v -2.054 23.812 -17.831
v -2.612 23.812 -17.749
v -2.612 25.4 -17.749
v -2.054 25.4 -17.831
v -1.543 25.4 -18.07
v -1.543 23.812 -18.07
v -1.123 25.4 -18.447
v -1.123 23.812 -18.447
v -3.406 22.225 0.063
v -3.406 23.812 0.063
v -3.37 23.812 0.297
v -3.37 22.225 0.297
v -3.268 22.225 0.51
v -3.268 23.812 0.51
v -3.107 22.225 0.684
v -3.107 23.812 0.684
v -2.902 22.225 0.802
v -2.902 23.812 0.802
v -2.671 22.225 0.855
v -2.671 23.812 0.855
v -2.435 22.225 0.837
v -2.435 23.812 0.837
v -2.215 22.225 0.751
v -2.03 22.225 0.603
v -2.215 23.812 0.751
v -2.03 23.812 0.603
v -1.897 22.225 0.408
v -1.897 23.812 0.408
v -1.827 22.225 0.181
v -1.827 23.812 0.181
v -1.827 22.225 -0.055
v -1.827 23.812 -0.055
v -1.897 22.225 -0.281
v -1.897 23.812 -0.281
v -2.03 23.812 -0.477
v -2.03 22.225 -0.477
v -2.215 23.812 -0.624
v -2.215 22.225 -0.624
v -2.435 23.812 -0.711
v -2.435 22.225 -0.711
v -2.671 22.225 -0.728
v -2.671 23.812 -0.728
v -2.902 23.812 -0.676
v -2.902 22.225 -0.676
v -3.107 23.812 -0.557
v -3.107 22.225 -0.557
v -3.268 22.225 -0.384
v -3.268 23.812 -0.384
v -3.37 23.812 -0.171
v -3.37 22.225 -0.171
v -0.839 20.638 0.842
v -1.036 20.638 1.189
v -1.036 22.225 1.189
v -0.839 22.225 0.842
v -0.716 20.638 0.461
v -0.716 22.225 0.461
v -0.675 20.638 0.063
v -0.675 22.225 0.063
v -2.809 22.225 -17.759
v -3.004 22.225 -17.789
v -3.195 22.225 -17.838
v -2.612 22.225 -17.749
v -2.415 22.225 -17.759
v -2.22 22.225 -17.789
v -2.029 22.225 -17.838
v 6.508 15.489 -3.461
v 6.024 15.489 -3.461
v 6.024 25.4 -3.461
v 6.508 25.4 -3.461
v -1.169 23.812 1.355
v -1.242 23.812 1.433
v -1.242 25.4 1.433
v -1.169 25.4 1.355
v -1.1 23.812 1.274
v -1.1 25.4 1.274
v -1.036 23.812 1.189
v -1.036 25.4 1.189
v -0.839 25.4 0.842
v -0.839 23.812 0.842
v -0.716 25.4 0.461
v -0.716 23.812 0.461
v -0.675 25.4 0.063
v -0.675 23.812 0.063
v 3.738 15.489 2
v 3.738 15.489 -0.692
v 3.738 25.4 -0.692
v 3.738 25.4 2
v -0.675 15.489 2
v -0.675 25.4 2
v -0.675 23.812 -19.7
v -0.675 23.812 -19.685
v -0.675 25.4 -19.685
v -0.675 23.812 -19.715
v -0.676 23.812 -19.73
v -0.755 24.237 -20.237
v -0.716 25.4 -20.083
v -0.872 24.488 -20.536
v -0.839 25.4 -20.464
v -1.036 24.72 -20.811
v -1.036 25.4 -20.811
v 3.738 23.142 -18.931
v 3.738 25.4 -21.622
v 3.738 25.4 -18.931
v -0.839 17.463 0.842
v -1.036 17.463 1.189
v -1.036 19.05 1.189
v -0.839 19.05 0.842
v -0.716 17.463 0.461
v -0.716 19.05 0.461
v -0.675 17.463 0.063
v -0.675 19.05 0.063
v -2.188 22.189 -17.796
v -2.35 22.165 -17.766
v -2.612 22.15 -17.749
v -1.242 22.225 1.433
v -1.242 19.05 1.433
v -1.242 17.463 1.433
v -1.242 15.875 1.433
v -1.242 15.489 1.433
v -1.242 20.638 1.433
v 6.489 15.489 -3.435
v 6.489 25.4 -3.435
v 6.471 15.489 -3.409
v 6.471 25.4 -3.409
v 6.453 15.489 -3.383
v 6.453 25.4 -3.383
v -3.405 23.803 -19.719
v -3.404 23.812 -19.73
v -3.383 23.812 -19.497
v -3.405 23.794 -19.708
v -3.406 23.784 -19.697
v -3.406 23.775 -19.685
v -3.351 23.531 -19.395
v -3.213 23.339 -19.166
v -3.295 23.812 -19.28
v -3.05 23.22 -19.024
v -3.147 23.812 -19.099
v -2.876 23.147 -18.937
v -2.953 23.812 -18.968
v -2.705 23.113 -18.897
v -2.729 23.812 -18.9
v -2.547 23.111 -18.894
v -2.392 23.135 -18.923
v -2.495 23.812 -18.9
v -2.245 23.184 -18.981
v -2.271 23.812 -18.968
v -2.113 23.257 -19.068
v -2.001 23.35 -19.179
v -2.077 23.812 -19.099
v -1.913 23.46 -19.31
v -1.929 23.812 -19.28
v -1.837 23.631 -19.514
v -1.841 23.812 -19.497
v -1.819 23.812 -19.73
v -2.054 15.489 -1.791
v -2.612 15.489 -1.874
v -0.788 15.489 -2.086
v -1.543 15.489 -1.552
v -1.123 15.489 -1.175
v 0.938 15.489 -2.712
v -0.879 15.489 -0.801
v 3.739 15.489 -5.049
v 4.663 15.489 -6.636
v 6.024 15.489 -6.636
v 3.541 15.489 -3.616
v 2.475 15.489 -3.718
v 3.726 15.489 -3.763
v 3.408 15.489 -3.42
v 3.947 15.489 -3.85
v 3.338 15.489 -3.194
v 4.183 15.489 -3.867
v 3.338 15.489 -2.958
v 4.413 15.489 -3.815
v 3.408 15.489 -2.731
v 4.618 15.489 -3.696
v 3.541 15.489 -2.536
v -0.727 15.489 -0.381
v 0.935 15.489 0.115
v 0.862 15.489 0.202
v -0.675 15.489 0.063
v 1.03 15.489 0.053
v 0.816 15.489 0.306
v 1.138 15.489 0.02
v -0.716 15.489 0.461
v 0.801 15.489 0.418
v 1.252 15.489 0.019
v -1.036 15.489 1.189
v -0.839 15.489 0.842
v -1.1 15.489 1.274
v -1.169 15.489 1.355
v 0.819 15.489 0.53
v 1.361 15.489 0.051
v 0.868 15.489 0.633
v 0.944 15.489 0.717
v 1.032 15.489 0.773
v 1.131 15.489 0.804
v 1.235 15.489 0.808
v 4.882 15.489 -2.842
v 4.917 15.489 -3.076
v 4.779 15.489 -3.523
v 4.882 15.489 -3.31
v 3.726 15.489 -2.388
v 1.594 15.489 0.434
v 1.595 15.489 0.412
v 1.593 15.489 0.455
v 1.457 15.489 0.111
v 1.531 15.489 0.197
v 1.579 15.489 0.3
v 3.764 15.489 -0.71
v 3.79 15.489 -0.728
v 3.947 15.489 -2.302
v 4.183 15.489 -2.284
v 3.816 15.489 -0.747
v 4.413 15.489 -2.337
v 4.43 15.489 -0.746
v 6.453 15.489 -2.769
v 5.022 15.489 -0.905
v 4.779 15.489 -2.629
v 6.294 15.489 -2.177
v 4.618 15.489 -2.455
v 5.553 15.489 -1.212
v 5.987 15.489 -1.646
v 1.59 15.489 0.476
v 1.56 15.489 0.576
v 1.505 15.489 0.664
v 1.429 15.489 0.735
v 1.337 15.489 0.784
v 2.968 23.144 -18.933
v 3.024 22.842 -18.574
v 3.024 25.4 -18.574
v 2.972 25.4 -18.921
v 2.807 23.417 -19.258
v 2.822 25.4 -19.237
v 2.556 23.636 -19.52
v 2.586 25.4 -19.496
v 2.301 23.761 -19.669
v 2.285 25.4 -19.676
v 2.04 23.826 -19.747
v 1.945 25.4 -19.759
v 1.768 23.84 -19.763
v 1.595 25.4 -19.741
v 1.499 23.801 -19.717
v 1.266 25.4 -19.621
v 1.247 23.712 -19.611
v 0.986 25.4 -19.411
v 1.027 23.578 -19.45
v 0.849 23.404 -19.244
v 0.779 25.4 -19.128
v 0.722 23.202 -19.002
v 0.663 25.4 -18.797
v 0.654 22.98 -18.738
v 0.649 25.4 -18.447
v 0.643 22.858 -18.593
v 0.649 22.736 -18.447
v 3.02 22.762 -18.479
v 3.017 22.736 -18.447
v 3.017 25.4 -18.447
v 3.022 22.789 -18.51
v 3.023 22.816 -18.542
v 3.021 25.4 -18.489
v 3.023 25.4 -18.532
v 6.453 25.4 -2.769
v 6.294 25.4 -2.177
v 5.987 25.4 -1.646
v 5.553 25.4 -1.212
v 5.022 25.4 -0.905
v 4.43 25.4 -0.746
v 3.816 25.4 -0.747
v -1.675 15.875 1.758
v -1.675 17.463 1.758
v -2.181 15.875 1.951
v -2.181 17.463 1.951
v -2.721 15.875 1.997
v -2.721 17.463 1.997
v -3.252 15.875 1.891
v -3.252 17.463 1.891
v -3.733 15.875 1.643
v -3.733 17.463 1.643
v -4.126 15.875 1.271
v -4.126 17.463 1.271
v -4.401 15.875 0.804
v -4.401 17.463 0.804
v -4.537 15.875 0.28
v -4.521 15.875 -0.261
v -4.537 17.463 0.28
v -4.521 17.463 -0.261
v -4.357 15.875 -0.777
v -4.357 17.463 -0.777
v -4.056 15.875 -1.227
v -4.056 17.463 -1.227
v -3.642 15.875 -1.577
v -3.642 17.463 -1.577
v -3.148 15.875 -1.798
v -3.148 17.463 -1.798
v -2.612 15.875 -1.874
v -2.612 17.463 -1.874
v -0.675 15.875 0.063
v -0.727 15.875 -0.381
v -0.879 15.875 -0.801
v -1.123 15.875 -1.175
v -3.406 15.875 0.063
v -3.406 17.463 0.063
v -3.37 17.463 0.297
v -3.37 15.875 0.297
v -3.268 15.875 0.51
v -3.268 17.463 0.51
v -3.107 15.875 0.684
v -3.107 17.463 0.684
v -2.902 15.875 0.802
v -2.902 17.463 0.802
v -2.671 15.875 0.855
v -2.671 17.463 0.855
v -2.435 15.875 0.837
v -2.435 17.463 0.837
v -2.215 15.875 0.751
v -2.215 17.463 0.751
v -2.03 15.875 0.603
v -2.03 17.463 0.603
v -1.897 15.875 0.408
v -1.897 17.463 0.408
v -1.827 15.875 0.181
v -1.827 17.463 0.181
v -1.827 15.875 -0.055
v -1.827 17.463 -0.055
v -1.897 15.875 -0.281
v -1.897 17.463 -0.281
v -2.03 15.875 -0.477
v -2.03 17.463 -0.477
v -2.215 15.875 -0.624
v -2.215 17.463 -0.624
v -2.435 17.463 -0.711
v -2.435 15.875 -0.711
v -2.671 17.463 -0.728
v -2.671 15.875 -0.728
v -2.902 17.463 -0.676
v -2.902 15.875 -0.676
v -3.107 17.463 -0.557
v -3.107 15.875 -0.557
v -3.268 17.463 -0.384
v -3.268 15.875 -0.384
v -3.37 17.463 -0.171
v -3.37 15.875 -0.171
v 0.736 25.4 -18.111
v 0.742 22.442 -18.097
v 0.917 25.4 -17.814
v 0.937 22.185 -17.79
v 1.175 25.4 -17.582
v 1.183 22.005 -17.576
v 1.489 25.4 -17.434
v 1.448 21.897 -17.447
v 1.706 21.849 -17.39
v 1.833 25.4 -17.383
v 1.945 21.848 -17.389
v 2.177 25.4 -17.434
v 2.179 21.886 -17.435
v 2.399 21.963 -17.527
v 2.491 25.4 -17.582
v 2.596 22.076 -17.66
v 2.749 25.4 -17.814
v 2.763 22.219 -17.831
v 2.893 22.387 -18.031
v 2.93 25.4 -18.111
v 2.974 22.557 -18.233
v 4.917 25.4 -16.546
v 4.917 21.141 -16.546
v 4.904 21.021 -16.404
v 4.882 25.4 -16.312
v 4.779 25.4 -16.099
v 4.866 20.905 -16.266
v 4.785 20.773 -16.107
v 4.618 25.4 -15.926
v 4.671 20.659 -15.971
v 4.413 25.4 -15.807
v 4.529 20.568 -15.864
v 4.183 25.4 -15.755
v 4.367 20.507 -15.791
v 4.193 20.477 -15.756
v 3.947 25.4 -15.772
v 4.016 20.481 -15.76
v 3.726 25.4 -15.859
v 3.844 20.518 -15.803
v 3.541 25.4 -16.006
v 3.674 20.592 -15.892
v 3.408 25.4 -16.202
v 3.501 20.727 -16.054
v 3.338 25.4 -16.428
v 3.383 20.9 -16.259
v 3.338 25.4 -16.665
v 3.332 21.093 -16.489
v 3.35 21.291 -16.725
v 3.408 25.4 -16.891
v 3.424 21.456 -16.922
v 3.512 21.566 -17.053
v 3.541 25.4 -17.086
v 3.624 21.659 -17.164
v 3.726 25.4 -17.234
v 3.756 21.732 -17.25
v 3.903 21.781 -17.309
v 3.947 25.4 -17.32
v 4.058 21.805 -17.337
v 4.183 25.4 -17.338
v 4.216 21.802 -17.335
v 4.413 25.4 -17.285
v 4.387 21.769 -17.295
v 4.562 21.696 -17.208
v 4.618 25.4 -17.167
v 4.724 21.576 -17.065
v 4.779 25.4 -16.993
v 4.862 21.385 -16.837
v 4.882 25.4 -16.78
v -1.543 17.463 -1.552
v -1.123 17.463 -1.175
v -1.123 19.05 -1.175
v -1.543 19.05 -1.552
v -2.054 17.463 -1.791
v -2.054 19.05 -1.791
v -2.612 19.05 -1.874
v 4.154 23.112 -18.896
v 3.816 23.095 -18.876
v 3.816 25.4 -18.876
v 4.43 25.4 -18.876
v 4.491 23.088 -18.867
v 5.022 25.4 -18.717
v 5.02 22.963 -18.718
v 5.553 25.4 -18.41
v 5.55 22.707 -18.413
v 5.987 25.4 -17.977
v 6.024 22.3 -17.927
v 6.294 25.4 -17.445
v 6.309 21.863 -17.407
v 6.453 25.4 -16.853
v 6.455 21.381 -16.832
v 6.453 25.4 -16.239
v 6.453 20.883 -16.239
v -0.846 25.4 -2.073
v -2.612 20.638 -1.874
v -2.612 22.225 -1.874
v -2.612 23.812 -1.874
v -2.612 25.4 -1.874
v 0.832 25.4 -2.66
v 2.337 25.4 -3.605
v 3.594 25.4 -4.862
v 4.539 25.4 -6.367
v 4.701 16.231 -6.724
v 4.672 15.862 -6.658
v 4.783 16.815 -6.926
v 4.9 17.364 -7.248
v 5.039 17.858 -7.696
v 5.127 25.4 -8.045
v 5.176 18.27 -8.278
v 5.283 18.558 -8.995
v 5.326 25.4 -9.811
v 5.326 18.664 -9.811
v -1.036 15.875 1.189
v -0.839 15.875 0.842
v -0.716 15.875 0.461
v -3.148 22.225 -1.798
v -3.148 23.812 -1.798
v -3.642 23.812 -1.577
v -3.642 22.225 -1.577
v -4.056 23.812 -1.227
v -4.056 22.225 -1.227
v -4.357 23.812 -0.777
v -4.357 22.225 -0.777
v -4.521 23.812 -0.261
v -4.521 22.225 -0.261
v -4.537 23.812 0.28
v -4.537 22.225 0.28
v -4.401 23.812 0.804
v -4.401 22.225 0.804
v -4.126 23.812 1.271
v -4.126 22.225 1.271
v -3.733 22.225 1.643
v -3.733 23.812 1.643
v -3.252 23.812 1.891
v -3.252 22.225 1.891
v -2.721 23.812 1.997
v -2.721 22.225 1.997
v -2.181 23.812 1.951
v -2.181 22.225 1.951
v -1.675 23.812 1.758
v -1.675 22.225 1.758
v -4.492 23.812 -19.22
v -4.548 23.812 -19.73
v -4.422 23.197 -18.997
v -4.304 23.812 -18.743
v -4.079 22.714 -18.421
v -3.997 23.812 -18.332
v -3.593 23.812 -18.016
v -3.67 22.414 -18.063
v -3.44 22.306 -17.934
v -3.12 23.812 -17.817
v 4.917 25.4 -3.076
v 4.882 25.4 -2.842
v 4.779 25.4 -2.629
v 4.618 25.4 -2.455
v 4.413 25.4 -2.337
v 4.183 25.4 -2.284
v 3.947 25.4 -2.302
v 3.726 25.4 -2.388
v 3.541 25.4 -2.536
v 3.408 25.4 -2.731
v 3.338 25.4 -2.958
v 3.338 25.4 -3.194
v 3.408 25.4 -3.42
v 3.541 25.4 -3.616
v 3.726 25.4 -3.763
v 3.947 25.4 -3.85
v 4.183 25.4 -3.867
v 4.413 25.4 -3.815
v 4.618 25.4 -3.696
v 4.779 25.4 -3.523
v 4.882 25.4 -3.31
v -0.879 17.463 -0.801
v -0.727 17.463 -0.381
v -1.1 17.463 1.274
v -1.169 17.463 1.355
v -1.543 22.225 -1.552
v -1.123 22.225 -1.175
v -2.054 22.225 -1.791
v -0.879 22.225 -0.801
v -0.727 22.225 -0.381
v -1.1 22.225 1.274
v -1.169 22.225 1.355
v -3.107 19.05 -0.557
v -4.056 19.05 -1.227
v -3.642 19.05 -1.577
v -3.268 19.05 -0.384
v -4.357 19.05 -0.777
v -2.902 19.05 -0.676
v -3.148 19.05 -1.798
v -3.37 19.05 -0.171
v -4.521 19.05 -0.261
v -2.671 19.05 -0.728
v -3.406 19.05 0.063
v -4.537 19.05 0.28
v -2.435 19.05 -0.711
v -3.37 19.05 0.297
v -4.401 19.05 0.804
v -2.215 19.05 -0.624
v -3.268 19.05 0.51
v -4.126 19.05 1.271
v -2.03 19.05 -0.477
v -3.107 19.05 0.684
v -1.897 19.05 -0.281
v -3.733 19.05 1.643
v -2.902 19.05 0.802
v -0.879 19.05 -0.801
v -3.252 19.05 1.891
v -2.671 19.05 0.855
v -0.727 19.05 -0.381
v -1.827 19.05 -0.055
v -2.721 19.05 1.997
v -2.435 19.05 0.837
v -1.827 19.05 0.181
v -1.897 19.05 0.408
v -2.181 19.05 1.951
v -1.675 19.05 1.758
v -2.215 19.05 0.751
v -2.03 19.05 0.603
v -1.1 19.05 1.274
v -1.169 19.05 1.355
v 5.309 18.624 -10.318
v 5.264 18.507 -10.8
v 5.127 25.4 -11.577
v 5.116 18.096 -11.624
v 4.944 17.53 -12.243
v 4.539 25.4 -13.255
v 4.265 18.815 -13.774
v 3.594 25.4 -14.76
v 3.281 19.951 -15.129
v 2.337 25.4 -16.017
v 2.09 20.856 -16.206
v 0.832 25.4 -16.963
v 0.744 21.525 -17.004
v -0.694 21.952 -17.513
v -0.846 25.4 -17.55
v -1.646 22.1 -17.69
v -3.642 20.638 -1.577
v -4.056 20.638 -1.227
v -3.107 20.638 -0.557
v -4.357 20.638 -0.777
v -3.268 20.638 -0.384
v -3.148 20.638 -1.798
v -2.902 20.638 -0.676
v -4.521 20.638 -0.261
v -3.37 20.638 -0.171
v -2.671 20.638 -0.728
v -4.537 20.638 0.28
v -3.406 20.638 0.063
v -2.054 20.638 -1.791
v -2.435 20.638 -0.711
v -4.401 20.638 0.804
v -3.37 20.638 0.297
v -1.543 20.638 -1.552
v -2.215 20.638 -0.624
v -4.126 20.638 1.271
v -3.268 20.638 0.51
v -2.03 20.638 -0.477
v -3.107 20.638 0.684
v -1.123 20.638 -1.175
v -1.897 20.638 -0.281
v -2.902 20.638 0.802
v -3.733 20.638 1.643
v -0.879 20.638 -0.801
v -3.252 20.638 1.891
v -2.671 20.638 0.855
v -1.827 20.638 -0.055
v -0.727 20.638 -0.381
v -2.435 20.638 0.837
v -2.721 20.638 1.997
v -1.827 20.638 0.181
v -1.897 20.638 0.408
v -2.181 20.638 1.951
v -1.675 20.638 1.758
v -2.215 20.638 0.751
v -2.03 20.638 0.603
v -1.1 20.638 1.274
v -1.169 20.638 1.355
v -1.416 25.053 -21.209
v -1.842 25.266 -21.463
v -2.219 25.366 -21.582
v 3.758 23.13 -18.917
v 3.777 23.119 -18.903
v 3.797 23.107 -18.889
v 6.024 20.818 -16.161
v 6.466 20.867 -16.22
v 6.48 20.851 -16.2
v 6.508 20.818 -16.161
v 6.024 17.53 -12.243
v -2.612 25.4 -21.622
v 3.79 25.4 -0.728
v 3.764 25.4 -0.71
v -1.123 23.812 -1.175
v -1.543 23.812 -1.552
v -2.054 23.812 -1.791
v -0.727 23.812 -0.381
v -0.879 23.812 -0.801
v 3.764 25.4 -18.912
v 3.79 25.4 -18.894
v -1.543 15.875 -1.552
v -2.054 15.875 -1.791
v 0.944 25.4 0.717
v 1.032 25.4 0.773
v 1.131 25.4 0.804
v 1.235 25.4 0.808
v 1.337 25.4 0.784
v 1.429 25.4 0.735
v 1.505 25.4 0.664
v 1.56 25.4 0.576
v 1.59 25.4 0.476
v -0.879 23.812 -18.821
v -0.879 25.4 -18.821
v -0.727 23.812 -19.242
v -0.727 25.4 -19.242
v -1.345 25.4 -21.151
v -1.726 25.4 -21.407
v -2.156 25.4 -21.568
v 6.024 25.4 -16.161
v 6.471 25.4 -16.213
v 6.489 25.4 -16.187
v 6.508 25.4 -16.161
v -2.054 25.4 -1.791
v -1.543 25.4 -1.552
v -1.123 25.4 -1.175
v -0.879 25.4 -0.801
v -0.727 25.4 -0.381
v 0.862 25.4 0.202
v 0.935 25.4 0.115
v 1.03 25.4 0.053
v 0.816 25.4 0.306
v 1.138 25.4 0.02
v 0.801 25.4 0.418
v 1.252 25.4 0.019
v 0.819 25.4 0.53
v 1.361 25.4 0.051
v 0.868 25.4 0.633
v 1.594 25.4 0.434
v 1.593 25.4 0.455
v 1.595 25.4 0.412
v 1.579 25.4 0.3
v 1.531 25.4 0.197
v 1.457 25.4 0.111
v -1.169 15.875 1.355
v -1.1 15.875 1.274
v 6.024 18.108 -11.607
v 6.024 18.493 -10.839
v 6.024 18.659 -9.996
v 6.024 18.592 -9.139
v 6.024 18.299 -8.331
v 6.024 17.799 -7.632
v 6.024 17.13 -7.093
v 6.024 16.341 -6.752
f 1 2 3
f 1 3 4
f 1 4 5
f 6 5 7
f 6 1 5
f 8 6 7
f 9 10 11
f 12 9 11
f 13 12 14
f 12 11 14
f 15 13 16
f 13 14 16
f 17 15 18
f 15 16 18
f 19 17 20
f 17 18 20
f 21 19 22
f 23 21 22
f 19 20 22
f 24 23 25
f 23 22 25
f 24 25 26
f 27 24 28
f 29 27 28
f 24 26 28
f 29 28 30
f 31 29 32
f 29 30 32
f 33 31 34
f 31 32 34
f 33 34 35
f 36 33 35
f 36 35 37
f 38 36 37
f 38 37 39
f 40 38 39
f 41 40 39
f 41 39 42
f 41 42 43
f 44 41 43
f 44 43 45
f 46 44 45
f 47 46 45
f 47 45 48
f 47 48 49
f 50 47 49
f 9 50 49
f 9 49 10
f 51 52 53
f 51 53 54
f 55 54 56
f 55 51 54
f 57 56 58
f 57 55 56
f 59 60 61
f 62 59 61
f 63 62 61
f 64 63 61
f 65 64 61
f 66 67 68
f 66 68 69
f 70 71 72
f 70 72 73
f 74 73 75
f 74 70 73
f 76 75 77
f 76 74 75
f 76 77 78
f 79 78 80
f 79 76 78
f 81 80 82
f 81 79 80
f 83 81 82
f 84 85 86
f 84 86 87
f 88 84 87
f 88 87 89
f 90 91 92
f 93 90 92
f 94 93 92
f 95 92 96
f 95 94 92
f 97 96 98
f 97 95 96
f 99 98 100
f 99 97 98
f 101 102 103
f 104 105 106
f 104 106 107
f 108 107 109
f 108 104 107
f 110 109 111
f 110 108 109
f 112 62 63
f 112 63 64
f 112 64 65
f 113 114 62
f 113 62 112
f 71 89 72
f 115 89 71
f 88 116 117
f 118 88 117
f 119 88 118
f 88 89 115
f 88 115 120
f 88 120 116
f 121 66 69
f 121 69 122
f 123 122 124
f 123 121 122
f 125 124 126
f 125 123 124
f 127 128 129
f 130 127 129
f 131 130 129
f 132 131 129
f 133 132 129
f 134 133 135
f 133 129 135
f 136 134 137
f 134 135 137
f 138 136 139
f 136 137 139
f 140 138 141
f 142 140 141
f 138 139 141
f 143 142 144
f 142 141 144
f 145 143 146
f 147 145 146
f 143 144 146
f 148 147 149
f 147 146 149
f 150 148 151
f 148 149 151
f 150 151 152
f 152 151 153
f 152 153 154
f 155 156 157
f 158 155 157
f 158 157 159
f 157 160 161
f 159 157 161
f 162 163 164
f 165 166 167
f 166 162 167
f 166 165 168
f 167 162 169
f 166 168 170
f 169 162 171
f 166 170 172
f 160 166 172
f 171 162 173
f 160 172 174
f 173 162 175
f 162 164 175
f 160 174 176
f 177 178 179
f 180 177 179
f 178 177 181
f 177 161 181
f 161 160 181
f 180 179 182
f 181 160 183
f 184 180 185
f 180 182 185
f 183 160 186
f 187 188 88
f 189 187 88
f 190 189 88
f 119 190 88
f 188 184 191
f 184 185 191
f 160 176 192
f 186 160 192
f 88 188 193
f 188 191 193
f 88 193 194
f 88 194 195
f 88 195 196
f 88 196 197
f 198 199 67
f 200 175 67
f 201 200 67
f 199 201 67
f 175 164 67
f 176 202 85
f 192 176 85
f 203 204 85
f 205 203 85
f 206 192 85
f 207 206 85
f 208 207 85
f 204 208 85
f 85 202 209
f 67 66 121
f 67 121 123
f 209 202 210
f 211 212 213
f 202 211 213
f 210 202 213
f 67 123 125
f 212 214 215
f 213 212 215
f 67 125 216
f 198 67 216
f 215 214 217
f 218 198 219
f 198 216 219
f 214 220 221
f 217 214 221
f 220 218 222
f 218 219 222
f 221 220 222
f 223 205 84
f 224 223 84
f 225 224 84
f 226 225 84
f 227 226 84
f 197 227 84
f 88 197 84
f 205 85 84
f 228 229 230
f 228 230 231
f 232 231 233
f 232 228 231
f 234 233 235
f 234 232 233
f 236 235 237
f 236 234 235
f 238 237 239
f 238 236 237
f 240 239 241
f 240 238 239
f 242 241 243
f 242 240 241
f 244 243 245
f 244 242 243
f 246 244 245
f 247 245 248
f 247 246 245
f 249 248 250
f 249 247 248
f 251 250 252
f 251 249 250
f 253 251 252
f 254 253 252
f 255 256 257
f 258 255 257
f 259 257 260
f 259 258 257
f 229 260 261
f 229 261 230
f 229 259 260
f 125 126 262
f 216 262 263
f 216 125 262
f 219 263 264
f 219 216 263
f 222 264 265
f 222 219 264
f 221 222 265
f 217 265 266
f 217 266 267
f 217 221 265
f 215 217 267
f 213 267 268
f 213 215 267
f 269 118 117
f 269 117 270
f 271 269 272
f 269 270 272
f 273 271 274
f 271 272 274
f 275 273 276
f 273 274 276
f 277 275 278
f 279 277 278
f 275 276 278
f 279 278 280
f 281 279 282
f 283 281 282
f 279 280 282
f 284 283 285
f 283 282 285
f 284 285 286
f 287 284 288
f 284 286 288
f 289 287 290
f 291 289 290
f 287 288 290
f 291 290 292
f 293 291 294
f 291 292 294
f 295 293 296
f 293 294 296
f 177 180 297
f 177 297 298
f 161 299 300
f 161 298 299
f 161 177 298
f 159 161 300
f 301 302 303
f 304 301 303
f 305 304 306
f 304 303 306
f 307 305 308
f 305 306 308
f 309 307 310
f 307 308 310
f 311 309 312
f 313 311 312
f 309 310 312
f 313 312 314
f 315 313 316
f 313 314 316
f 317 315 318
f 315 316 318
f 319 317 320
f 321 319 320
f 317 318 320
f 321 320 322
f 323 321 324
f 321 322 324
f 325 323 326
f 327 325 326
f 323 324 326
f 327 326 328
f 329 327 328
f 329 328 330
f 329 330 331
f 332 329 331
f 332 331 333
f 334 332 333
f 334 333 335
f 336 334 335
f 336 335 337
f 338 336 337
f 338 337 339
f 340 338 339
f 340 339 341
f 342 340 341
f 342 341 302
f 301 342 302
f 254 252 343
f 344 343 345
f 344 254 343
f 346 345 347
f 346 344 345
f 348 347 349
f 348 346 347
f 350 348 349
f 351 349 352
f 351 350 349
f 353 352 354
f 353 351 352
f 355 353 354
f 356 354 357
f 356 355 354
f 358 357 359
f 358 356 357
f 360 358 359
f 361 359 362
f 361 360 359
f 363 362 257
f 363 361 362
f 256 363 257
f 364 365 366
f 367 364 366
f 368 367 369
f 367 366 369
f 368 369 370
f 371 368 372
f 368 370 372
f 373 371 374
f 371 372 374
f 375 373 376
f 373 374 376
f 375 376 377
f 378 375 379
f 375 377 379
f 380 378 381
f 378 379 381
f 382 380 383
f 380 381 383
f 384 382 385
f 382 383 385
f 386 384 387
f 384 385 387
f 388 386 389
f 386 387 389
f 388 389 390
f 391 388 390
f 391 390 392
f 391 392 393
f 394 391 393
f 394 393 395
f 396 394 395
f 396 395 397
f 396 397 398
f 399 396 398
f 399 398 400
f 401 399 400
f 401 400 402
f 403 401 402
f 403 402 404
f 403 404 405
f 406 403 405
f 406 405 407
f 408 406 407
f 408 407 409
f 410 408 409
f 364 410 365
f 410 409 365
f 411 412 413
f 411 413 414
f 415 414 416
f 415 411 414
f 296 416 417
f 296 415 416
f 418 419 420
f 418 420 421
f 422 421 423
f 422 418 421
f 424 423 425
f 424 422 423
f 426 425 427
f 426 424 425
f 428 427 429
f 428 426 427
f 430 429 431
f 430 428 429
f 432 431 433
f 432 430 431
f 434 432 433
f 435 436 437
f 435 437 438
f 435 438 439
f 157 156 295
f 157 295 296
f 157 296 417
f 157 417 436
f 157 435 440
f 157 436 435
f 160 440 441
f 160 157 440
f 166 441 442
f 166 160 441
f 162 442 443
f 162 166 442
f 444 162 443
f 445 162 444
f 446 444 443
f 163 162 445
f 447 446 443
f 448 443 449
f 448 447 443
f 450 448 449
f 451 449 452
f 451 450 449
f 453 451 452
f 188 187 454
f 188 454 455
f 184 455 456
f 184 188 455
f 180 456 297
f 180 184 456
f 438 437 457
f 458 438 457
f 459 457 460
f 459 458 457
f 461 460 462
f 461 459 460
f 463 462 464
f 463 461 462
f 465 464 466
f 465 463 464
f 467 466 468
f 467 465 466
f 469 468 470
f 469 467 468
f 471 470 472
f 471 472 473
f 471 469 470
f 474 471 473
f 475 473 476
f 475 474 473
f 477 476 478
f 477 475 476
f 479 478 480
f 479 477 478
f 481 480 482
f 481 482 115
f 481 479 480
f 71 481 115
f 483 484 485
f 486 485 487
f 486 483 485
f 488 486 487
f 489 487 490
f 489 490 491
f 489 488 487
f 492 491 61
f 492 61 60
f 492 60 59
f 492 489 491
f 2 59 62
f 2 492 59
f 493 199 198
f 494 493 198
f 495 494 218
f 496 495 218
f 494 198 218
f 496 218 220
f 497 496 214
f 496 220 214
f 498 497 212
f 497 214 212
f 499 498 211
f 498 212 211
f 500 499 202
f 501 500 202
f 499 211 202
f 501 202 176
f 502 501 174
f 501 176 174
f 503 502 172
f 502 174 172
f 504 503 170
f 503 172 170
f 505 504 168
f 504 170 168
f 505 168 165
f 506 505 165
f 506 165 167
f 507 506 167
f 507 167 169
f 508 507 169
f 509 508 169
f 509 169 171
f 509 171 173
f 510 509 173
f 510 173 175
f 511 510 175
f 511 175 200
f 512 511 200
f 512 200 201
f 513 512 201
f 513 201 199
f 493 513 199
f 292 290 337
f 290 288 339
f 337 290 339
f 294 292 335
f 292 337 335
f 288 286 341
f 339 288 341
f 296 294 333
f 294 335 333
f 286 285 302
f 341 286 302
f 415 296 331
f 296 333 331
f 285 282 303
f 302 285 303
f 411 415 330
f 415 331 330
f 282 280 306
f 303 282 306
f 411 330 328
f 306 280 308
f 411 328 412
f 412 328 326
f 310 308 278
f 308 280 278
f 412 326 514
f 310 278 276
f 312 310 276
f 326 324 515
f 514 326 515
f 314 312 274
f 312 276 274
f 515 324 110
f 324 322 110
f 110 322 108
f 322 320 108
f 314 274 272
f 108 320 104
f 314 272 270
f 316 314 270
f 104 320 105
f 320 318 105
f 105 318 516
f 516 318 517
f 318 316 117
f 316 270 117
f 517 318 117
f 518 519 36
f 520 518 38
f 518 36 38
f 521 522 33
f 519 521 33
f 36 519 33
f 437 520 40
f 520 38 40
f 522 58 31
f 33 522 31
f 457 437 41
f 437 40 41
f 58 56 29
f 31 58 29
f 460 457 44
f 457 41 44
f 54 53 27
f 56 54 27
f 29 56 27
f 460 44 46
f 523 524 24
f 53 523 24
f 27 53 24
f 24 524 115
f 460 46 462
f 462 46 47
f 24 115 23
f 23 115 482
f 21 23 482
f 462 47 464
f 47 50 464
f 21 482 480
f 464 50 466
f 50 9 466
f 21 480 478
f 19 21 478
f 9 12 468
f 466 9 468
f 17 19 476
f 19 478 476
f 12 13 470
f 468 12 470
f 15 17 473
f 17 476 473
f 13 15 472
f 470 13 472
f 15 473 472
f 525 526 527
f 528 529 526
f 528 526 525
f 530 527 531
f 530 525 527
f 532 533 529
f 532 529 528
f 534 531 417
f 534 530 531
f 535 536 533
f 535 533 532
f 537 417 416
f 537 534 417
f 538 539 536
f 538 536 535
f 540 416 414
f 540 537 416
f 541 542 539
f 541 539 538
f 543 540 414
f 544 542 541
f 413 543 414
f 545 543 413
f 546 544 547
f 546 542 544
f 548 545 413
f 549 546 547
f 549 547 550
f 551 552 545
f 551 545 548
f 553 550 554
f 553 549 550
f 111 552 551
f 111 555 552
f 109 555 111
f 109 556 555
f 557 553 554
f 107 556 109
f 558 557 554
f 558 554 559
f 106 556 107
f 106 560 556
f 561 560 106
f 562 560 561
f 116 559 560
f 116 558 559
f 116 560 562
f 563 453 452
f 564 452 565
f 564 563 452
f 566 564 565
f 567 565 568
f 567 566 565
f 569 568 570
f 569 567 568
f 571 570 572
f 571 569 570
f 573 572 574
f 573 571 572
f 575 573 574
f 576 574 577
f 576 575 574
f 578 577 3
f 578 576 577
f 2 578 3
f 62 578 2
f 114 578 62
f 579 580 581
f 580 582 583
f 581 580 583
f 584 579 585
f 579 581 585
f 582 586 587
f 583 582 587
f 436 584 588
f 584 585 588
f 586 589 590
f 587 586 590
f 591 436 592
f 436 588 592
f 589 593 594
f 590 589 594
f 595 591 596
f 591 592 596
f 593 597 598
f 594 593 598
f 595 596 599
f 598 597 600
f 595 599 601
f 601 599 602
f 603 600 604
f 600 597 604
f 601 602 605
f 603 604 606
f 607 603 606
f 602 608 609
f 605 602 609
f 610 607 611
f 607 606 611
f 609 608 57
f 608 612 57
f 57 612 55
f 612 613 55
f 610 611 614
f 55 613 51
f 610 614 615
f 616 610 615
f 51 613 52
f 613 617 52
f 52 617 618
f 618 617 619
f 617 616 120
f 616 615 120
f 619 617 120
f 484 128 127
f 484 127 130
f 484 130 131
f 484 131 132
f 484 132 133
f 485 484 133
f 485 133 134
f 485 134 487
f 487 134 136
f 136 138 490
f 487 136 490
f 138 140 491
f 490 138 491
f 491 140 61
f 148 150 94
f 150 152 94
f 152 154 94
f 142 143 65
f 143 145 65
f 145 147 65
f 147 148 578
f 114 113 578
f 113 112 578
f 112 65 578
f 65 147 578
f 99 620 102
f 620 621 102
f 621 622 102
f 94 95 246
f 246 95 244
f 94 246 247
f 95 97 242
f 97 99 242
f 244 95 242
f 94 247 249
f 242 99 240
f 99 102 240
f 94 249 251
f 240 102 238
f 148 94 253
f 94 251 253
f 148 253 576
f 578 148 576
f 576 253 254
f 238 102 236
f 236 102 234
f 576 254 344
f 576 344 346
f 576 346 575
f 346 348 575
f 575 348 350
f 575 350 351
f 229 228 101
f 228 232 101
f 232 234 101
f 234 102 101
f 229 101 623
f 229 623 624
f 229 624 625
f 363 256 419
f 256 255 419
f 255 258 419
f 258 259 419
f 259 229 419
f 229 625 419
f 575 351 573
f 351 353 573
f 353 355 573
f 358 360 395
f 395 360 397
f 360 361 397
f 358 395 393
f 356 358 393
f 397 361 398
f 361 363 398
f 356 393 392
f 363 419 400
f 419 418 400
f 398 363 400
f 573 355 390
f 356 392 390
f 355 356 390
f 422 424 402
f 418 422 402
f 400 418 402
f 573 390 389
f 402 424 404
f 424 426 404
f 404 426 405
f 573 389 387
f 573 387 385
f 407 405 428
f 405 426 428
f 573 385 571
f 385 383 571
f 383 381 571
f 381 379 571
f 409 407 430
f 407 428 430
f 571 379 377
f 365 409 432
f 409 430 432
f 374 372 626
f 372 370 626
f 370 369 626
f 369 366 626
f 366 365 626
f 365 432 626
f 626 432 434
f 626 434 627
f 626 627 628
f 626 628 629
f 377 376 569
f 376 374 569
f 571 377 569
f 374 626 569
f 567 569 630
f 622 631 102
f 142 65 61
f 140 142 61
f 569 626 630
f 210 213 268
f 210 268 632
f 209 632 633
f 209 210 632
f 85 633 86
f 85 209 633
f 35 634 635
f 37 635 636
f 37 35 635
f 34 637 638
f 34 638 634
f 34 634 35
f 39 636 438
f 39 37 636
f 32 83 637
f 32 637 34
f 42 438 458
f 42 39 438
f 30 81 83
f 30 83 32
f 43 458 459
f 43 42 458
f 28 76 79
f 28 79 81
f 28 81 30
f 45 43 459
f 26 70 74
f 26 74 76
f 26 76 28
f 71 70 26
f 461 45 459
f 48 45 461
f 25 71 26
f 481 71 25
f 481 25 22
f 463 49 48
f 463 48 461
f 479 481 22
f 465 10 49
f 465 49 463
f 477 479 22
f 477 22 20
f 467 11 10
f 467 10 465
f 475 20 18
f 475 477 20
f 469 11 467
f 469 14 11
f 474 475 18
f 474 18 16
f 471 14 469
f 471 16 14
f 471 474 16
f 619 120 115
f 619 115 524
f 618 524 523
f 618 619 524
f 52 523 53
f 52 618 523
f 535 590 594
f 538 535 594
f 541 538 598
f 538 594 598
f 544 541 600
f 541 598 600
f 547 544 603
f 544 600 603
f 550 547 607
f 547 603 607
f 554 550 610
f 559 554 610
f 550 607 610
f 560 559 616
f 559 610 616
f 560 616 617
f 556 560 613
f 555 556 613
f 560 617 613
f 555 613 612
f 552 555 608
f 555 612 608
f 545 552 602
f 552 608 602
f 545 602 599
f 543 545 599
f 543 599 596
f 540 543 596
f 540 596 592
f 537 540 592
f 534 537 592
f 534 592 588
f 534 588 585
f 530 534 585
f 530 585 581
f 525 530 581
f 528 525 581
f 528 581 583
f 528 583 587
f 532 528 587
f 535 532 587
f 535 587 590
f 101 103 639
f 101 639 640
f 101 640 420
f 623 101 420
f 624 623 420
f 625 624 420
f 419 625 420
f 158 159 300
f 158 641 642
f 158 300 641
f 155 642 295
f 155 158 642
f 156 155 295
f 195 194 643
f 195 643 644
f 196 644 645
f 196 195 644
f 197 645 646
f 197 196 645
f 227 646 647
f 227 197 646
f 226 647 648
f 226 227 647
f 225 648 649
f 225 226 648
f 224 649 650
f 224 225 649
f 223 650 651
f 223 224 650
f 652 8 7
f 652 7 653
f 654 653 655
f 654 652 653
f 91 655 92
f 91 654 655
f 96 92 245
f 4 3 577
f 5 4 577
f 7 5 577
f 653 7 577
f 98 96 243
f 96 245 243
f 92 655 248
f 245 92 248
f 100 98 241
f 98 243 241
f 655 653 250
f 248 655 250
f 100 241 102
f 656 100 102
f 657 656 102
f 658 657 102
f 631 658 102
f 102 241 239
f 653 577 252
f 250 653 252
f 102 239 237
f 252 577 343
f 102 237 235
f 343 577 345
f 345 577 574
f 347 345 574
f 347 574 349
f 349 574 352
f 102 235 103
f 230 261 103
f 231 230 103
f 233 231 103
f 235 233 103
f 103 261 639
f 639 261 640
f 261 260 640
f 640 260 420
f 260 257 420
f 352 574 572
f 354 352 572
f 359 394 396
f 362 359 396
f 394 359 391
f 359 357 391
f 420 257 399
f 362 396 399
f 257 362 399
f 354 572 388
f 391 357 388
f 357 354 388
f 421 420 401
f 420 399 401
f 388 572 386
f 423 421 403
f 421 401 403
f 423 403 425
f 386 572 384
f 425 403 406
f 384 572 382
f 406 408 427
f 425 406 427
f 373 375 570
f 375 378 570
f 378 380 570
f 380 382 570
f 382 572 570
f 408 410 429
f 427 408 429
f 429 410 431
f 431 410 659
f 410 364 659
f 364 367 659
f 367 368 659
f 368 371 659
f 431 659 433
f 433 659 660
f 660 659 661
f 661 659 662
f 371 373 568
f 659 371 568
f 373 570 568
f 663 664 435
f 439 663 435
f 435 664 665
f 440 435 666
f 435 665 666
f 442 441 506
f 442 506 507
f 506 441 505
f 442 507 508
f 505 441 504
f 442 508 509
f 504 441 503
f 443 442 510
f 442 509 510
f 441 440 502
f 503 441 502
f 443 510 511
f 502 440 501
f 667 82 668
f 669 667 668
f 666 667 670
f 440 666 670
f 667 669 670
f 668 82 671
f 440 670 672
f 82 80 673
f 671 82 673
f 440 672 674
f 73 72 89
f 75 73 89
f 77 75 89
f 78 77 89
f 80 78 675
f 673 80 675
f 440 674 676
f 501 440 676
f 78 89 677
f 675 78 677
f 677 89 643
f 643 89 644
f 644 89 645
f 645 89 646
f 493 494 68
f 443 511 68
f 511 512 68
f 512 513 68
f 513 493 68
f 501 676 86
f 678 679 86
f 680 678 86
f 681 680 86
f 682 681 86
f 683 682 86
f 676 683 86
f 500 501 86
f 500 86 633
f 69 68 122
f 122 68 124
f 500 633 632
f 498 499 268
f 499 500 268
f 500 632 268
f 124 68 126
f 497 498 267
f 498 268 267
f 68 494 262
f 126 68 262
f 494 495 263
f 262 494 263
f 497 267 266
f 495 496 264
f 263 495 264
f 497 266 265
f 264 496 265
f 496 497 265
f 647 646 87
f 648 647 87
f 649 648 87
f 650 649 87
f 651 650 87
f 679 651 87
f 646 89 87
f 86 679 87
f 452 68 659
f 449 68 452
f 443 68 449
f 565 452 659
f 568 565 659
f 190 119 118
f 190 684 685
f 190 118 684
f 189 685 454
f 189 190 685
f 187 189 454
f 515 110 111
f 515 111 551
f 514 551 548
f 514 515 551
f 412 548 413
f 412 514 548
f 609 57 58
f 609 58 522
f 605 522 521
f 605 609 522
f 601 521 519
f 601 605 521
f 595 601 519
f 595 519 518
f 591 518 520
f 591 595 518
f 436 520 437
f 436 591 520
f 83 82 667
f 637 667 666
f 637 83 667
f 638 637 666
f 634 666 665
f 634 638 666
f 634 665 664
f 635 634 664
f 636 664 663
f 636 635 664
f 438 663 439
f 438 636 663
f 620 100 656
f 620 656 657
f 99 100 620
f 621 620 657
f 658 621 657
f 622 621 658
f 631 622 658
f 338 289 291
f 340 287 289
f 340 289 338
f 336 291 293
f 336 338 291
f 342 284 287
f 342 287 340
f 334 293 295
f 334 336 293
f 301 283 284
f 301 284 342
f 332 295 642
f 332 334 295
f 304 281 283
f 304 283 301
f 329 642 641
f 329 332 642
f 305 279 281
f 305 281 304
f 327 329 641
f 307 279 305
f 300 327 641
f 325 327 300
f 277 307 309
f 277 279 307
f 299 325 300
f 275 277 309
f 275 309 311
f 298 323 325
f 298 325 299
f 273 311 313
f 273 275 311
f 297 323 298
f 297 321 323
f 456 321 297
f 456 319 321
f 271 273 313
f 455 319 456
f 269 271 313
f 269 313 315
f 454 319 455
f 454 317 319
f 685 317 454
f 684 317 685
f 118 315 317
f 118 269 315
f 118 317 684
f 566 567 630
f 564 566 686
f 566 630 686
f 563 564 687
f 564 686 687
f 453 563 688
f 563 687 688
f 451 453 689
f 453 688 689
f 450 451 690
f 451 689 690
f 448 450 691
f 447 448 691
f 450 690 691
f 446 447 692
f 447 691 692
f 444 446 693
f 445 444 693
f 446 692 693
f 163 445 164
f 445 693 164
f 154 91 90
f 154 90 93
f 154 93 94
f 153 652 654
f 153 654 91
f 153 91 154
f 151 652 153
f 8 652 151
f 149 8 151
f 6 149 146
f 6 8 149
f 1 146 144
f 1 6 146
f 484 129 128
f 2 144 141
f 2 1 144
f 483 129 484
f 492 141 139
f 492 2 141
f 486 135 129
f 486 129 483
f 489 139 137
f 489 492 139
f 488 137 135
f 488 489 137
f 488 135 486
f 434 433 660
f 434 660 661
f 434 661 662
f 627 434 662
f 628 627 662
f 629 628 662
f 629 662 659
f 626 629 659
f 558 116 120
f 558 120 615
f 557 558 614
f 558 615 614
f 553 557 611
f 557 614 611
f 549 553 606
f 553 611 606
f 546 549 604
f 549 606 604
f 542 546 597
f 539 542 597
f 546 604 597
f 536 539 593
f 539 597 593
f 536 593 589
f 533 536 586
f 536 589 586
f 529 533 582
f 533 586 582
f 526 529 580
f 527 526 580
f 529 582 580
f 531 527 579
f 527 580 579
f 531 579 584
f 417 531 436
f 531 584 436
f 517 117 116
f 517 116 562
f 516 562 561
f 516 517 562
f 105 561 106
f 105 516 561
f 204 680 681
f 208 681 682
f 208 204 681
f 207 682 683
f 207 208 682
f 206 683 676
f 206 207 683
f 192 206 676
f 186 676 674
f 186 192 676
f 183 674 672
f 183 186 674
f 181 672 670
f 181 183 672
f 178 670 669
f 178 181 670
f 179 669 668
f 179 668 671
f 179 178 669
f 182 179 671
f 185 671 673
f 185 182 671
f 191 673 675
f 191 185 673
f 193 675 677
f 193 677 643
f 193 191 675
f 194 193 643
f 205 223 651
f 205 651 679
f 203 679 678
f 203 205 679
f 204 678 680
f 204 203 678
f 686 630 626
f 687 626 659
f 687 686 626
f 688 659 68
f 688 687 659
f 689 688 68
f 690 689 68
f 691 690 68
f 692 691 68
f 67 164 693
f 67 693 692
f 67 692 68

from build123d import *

# Parameters (mm, degrees)
F0_R           = 0.79375
F1_DEPTH       = 25.4
F3_START       = -1.5875
F2_R           = 1.93675
F3_DEPTH       = 1.5875
F5_START       = 1.5875
F4_R           = 1.93675
F5_DEPTH       = 1.5875
F7_START       = 1.5875
F6_R           = 1.93675
F7_DEPTH       = 1.5875
F9_START       = 1.5875
F8_R           = 1.93675
F9_DEPTH       = 1.5875
F11_START      = 1.5875
F10_R          = 1.93675
F11_DEPTH      = 1.5875
F13_START      = 1.5875
F12_R          = 1.93675
F13_DEPTH      = 1.5875
F14_R          = 0.79375
F15_DEPTH      = 23.8135
F16_R          = 0.79375
F17_DEPTH      = 23.8135
F19_DEPTH      = 25.4
F19_DEPTH_BACK = 25.4
F20_R          = 3.175
F21_DEPTH      = 25.4


with BuildPart() as f1:
    # F0 (on Front) → F1 (new body)
    with BuildSketch(Plane.XZ):
        with BuildLine():
            ThreePointArc((1.5896937253, 0.4764627531), (2.6960840616, -0.0482905293), (3.7380205176, -0.6915898416))
            Line((3.7380205176, -0.6915898416), (3.7380205176, 1.9999169571))
            Line((3.7380205176, 1.9999169571), (-0.6752294824, 1.9999169571))
            Line((-0.6752294824, 1.9999169571), (-1.2424904239, 1.4326560155))
            ThreePointArc((-1.2424904239, 1.4326560155), (-1.1342950237, 1.3151450731), (-1.0361511327, 1.1891179217))
            ThreePointArc((-1.0361511327, 1.1891179217), (-0.0353529614, 0.9985724567), (0.9437888558, 0.7171726424))
            ThreePointArc((0.9437888558, 0.7171726424), (1.336612932, 0.7843066024), (1.5896937253, 0.4764627531))
        make_face()
        with BuildLine():
            ThreePointArc((-0.6752294824, 0.0631669571), (-0.7905484204, -0.5951562531), (-1.1227724786, -1.1750830429))
            Line((-1.1227724786, -1.1750830429), (3.7380205176, -1.1750830429))
            Line((3.7380205176, -1.1750830429), (3.7380205176, -0.6915898416))
            ThreePointArc((3.7380205176, -0.6915898416), (2.6960840616, -0.0482905293), (1.5896937253, 0.4764627531))
            ThreePointArc((1.5896937253, 0.4764627531), (1.5935929319, 0.4445453037), (1.5948955176, 0.4124169571))
            ThreePointArc((1.5948955176, 0.4124169571), (1.0297772788, 0.0529674082), (0.9437888558, 0.7171726424))
            ThreePointArc((0.9437888558, 0.7171726424), (-0.0353529614, 0.9985724567), (-1.0361511327, 1.1891179217))
            ThreePointArc((-1.0361511327, 1.1891179217), (-0.7676657728, 0.654358553), (-0.6752294824, 0.0631669571))
        make_face()
        with BuildLine():
            ThreePointArc((-2.6119794826, -1.8735830429), (3.0006805932, -4.1984229672), (5.3255205176, -9.8110830429))
            ThreePointArc((5.3255205176, -9.8110830429), (3.0006805933, -15.4237431186), (-2.6119794824, -17.7485830429))
            ThreePointArc((-2.6119794824, -17.7485830429), (-1.7895380331, -17.9318819815), (-1.1227724786, -18.4470830429))
            Line((-1.1227724786, -18.4470830429), (0.6491882277, -18.4470830429))
            ThreePointArc((0.6491882277, -18.4470830429), (1.8330205176, -17.3834580429), (3.0168528075, -18.4470830429))
            Line((3.0168528075, -18.4470830429), (3.7380205176, -18.4470830429))
            Line((3.7380205176, -18.4470830429), (3.7380205176, -18.9305762443))
            ThreePointArc((3.7380205176, -18.9305762443), (3.777174424, -18.9031877834), (3.8162102016, -18.8756312191))
            ThreePointArc((3.8162102016, -18.8756312191), (5.7845599908, -18.2076225161), (6.4525686938, -16.2392727269))
            ThreePointArc((6.4525686938, -16.2392727269), (6.4801252581, -16.2002369493), (6.507513719, -16.1610830429))
            Line((6.507513719, -16.1610830429), (6.0240205176, -16.1610830429))
            Line((6.0240205176, -16.1610830429), (6.0240205176, -3.4610830429))
            Line((6.0240205176, -3.4610830429), (6.507513719, -3.4610830429))
            ThreePointArc((6.507513719, -3.4610830429), (6.4801252581, -3.4219291366), (6.4525686938, -3.382893359))
            ThreePointArc((6.4525686938, -3.382893359), (5.7845599908, -1.4145435697), (3.8162102016, -0.7465348668))
            ThreePointArc((3.8162102016, -0.7465348668), (3.777174424, -0.7189783025), (3.7380205176, -0.6915898416))
            Line((3.7380205176, -0.6915898416), (3.7380205176, -1.1750830429))
            Line((3.7380205176, -1.1750830429), (-1.1227724786, -1.1750830429))
            ThreePointArc((-1.1227724786, -1.1750830429), (-1.7895380332, -1.6902841045), (-2.6119794826, -1.8735830429))
        make_face()
        with Locations((4.1232126084, -16.5462751337)):
            Circle(F0_R, mode=Mode.SUBTRACT)
        with Locations((4.1232126084, -3.0758909521)):
            Circle(F0_R, mode=Mode.SUBTRACT)
        with BuildLine():
            Line((0.6491882277, -18.4470830429), (-1.1227724786, -18.4470830429))
            ThreePointArc((-1.1227724786, -18.4470830429), (-0.7905484204, -19.0270098328), (-0.6752294824, -19.6853330429))
            ThreePointArc((-0.6752294824, -19.6853330429), (-0.7676657728, -20.2765246389), (-1.0361511327, -20.8112840076))
            ThreePointArc((-1.0361511327, -20.8112840076), (1.4609745046, -20.150265896), (3.7380205176, -18.9305762443))
            Line((3.7380205176, -18.9305762443), (3.7380205176, -18.4470830429))
            Line((3.7380205176, -18.4470830429), (3.0168528075, -18.4470830429))
            ThreePointArc((3.0168528075, -18.4470830429), (3.0219461273, -18.5104922792), (3.0236455176, -18.5740830429))
            ThreePointArc((3.0236455176, -18.5740830429), (1.7694297539, -19.7630086526), (0.6491882277, -18.4470830429))
        make_face()
        with BuildLine():
            ThreePointArc((3.7380205176, -18.9305762443), (1.4609745046, -20.150265896), (-1.0361511327, -20.8112840076))
            ThreePointArc((-1.0361511327, -20.8112840076), (-1.7258883381, -21.4074953601), (-2.6119794824, -21.6220830429))
            Line((-2.6119794824, -21.6220830429), (3.7380205176, -21.6220830429))
            Line((3.7380205176, -21.6220830429), (3.7380205176, -18.9305762443))
        make_face()
    extrude(amount=-F1_DEPTH)

    # F2 (on face) → F3 (join)
    with BuildSketch(Plane(origin=(0, 25.4, 0), x_dir=(-1, 0, 0), z_dir=(0, 1, 0)).offset(F3_START)):
        with Locations((2.6119794824, 0.0631669571)):
            Circle(F2_R)
        with Locations((2.6119794824, -19.6853330429)):
            Circle(F2_R)
    extrude(amount=-F3_DEPTH)

    # F4 (on face) → F5 (join)
    with BuildSketch(Plane.XZ.offset(-22.225).offset(F5_START)):
        with Locations((-2.6119794824, 0.0631669571)):
            Circle(F4_R)
    extrude(amount=F5_DEPTH)

    # F6 (on face) → F7 (join)
    with BuildSketch(Plane.XZ.offset(-19.05).offset(F7_START)):
        with Locations((-2.6119794824, 0.0631669571)):
            Circle(F6_R)
    extrude(amount=F7_DEPTH)

    # F8 (on face) → F9 (join)
    with BuildSketch(Plane.XZ.offset(-15.875).offset(F9_START)):
        with Locations((-2.6119794824, 0.0631669571)):
            Circle(F8_R)
    extrude(amount=F9_DEPTH)

    # F10 (on face) → F11 (join)
    with BuildSketch(Plane.XZ.offset(-12.7).offset(F11_START)):
        with Locations((-2.6119794824, 0.0631669571)):
            Circle(F10_R)
    extrude(amount=F11_DEPTH)

    # F12 (on face) → F13 (join)
    with BuildSketch(Plane.XZ.offset(-22.225).offset(F13_START)):
        with Locations((-2.6119794824, -19.6853330429)):
            Circle(F12_R)
    extrude(amount=F13_DEPTH)

    # F14 (on face) → F15 (cut, through all)
    with BuildSketch(Plane(origin=(0, 23.8125, 0), x_dir=(-1, 0, 0), z_dir=(0, 1, 0))):
        with Locations((2.6119794824, 0.0631669571)):
            Circle(F14_R)
    extrude(amount=-F15_DEPTH, mode=Mode.SUBTRACT)

    # F16 (on face) → F17 (cut, through all)
    with BuildSketch(Plane(origin=(0, 23.8125, 0), x_dir=(-1, 0, 0), z_dir=(0, 1, 0))):
        with Locations((2.6119794824, -19.6853330429)):
            Circle(F16_R)
    extrude(amount=-F17_DEPTH, mode=Mode.SUBTRACT)

    # F18 (on face) → F19 (cut, two sides)
    with BuildSketch(Plane.YZ.offset(6.0240205176)) as f19_sk:
        Polygon((21.9337120652, -25.8094575256), (25.4, -21.6220830429), (15.4893942562, -9.8110830429), (15.4893942562, 6.843551062), (-6.1063589528, 6.843551062), (-6.1063589528, -25.8094575256), align=None)
    extrude(amount=-F19_DEPTH, mode=Mode.SUBTRACT)
    extrude(f19_sk.sketch, amount=F19_DEPTH_BACK, mode=Mode.SUBTRACT)

    # F20 (on face) → F21 (cut)
    with BuildSketch(Plane.YZ.offset(6.0240205176)):
        with Locations((15.4893942562, -9.8110830429)):
            Circle(F20_R)
    extrude(amount=-F21_DEPTH, mode=Mode.SUBTRACT)


solid = f1.part
